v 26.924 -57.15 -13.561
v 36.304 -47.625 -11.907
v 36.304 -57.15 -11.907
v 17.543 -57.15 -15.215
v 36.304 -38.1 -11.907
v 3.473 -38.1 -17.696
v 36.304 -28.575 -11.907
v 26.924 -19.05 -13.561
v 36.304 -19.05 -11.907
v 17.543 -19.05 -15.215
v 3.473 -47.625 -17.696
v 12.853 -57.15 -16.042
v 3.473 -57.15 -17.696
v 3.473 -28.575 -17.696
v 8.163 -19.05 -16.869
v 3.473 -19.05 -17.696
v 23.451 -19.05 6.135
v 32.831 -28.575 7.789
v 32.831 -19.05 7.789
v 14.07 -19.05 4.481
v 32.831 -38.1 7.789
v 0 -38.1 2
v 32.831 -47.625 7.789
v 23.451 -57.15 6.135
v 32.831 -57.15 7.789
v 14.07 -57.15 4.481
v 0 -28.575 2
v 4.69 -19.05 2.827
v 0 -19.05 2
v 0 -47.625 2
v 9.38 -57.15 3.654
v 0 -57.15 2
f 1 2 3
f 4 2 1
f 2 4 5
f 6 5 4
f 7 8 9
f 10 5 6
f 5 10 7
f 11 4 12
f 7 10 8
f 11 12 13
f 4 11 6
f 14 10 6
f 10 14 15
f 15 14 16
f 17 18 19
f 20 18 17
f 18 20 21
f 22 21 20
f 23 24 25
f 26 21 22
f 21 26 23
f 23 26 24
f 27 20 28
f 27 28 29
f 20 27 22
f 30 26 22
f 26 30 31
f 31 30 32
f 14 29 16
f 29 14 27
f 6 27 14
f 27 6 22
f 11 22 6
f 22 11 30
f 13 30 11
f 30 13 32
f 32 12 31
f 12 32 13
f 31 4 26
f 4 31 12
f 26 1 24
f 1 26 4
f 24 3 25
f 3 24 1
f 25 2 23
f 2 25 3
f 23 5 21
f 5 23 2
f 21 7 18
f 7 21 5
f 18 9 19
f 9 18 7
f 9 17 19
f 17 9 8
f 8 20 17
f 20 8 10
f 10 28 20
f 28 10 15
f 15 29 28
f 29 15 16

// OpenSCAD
translate([0,0,2]) rotate([0,-10,0]) translate([-19.05, 0,-10]) polyhedron(
    points=[
    [19.05, -19.05, -10],
    [19.05, -28.575, -10],
    [19.05, -38.1, -10],
    [19.05, -47.625, -10],
    [19.05, -57.15, -10],
    [28.575, -57.15, -10],
    [33.3375, -57.15, -10],
    [42.8625, -57.15, -10],
    [52.3875, -57.15, -10],
    [52.3875, -47.625, -10],
    [52.3875, -38.1, -10],
    [52.3875, -28.575, -10],
    [52.3875, -19.05, -10],
    [42.8625, -19.05, -10],
    [33.3375, -19.05, -10],
    [23.8125, -19.05, -10],
    [19.05, -19.05, 10],
    [19.05, -28.575, 10],
    [19.05, -38.1, 10],
    [19.05, -47.625, 10],
    [19.05, -57.15, 10],
    [28.575, -57.15, 10],
    [33.3375, -57.15, 10],
    [42.8625, -57.15, 10],
    [52.3875, -57.15, 10],
    [52.3875, -47.625, 10],
    [52.3875, -38.1, 10],
    [52.3875, -28.575, 10],
    [52.3875, -19.05, 10],
    [42.8625, -19.05, 10],
    [33.3375, -19.05, 10],
    [23.8125, -19.05, 10],
    ],
    faces=[
        [0,1,2,3,4,5,6,7,8,9,10,11,12,13,14,15],
        [31,30,29,28,27,26,25,24,23,22,21,20,19,18,17,16],
        [0,16,17,1],
        [1,17,18,2],
        [2,18,19,3],
        [3,19,20,4],
        [4,20,21,5],
        [5,21,22,6],
        [6,22,23,7],
        [7,23,24,8],
        [8,24,25,9],
        [9,25,26,10],
        [10,26,27,11],
        [11,27,28,12],
        [12,28,29,13],
        [13,29,30,14],
        [14,30,31,15],
        [15,31,16,0],
    ]
);
